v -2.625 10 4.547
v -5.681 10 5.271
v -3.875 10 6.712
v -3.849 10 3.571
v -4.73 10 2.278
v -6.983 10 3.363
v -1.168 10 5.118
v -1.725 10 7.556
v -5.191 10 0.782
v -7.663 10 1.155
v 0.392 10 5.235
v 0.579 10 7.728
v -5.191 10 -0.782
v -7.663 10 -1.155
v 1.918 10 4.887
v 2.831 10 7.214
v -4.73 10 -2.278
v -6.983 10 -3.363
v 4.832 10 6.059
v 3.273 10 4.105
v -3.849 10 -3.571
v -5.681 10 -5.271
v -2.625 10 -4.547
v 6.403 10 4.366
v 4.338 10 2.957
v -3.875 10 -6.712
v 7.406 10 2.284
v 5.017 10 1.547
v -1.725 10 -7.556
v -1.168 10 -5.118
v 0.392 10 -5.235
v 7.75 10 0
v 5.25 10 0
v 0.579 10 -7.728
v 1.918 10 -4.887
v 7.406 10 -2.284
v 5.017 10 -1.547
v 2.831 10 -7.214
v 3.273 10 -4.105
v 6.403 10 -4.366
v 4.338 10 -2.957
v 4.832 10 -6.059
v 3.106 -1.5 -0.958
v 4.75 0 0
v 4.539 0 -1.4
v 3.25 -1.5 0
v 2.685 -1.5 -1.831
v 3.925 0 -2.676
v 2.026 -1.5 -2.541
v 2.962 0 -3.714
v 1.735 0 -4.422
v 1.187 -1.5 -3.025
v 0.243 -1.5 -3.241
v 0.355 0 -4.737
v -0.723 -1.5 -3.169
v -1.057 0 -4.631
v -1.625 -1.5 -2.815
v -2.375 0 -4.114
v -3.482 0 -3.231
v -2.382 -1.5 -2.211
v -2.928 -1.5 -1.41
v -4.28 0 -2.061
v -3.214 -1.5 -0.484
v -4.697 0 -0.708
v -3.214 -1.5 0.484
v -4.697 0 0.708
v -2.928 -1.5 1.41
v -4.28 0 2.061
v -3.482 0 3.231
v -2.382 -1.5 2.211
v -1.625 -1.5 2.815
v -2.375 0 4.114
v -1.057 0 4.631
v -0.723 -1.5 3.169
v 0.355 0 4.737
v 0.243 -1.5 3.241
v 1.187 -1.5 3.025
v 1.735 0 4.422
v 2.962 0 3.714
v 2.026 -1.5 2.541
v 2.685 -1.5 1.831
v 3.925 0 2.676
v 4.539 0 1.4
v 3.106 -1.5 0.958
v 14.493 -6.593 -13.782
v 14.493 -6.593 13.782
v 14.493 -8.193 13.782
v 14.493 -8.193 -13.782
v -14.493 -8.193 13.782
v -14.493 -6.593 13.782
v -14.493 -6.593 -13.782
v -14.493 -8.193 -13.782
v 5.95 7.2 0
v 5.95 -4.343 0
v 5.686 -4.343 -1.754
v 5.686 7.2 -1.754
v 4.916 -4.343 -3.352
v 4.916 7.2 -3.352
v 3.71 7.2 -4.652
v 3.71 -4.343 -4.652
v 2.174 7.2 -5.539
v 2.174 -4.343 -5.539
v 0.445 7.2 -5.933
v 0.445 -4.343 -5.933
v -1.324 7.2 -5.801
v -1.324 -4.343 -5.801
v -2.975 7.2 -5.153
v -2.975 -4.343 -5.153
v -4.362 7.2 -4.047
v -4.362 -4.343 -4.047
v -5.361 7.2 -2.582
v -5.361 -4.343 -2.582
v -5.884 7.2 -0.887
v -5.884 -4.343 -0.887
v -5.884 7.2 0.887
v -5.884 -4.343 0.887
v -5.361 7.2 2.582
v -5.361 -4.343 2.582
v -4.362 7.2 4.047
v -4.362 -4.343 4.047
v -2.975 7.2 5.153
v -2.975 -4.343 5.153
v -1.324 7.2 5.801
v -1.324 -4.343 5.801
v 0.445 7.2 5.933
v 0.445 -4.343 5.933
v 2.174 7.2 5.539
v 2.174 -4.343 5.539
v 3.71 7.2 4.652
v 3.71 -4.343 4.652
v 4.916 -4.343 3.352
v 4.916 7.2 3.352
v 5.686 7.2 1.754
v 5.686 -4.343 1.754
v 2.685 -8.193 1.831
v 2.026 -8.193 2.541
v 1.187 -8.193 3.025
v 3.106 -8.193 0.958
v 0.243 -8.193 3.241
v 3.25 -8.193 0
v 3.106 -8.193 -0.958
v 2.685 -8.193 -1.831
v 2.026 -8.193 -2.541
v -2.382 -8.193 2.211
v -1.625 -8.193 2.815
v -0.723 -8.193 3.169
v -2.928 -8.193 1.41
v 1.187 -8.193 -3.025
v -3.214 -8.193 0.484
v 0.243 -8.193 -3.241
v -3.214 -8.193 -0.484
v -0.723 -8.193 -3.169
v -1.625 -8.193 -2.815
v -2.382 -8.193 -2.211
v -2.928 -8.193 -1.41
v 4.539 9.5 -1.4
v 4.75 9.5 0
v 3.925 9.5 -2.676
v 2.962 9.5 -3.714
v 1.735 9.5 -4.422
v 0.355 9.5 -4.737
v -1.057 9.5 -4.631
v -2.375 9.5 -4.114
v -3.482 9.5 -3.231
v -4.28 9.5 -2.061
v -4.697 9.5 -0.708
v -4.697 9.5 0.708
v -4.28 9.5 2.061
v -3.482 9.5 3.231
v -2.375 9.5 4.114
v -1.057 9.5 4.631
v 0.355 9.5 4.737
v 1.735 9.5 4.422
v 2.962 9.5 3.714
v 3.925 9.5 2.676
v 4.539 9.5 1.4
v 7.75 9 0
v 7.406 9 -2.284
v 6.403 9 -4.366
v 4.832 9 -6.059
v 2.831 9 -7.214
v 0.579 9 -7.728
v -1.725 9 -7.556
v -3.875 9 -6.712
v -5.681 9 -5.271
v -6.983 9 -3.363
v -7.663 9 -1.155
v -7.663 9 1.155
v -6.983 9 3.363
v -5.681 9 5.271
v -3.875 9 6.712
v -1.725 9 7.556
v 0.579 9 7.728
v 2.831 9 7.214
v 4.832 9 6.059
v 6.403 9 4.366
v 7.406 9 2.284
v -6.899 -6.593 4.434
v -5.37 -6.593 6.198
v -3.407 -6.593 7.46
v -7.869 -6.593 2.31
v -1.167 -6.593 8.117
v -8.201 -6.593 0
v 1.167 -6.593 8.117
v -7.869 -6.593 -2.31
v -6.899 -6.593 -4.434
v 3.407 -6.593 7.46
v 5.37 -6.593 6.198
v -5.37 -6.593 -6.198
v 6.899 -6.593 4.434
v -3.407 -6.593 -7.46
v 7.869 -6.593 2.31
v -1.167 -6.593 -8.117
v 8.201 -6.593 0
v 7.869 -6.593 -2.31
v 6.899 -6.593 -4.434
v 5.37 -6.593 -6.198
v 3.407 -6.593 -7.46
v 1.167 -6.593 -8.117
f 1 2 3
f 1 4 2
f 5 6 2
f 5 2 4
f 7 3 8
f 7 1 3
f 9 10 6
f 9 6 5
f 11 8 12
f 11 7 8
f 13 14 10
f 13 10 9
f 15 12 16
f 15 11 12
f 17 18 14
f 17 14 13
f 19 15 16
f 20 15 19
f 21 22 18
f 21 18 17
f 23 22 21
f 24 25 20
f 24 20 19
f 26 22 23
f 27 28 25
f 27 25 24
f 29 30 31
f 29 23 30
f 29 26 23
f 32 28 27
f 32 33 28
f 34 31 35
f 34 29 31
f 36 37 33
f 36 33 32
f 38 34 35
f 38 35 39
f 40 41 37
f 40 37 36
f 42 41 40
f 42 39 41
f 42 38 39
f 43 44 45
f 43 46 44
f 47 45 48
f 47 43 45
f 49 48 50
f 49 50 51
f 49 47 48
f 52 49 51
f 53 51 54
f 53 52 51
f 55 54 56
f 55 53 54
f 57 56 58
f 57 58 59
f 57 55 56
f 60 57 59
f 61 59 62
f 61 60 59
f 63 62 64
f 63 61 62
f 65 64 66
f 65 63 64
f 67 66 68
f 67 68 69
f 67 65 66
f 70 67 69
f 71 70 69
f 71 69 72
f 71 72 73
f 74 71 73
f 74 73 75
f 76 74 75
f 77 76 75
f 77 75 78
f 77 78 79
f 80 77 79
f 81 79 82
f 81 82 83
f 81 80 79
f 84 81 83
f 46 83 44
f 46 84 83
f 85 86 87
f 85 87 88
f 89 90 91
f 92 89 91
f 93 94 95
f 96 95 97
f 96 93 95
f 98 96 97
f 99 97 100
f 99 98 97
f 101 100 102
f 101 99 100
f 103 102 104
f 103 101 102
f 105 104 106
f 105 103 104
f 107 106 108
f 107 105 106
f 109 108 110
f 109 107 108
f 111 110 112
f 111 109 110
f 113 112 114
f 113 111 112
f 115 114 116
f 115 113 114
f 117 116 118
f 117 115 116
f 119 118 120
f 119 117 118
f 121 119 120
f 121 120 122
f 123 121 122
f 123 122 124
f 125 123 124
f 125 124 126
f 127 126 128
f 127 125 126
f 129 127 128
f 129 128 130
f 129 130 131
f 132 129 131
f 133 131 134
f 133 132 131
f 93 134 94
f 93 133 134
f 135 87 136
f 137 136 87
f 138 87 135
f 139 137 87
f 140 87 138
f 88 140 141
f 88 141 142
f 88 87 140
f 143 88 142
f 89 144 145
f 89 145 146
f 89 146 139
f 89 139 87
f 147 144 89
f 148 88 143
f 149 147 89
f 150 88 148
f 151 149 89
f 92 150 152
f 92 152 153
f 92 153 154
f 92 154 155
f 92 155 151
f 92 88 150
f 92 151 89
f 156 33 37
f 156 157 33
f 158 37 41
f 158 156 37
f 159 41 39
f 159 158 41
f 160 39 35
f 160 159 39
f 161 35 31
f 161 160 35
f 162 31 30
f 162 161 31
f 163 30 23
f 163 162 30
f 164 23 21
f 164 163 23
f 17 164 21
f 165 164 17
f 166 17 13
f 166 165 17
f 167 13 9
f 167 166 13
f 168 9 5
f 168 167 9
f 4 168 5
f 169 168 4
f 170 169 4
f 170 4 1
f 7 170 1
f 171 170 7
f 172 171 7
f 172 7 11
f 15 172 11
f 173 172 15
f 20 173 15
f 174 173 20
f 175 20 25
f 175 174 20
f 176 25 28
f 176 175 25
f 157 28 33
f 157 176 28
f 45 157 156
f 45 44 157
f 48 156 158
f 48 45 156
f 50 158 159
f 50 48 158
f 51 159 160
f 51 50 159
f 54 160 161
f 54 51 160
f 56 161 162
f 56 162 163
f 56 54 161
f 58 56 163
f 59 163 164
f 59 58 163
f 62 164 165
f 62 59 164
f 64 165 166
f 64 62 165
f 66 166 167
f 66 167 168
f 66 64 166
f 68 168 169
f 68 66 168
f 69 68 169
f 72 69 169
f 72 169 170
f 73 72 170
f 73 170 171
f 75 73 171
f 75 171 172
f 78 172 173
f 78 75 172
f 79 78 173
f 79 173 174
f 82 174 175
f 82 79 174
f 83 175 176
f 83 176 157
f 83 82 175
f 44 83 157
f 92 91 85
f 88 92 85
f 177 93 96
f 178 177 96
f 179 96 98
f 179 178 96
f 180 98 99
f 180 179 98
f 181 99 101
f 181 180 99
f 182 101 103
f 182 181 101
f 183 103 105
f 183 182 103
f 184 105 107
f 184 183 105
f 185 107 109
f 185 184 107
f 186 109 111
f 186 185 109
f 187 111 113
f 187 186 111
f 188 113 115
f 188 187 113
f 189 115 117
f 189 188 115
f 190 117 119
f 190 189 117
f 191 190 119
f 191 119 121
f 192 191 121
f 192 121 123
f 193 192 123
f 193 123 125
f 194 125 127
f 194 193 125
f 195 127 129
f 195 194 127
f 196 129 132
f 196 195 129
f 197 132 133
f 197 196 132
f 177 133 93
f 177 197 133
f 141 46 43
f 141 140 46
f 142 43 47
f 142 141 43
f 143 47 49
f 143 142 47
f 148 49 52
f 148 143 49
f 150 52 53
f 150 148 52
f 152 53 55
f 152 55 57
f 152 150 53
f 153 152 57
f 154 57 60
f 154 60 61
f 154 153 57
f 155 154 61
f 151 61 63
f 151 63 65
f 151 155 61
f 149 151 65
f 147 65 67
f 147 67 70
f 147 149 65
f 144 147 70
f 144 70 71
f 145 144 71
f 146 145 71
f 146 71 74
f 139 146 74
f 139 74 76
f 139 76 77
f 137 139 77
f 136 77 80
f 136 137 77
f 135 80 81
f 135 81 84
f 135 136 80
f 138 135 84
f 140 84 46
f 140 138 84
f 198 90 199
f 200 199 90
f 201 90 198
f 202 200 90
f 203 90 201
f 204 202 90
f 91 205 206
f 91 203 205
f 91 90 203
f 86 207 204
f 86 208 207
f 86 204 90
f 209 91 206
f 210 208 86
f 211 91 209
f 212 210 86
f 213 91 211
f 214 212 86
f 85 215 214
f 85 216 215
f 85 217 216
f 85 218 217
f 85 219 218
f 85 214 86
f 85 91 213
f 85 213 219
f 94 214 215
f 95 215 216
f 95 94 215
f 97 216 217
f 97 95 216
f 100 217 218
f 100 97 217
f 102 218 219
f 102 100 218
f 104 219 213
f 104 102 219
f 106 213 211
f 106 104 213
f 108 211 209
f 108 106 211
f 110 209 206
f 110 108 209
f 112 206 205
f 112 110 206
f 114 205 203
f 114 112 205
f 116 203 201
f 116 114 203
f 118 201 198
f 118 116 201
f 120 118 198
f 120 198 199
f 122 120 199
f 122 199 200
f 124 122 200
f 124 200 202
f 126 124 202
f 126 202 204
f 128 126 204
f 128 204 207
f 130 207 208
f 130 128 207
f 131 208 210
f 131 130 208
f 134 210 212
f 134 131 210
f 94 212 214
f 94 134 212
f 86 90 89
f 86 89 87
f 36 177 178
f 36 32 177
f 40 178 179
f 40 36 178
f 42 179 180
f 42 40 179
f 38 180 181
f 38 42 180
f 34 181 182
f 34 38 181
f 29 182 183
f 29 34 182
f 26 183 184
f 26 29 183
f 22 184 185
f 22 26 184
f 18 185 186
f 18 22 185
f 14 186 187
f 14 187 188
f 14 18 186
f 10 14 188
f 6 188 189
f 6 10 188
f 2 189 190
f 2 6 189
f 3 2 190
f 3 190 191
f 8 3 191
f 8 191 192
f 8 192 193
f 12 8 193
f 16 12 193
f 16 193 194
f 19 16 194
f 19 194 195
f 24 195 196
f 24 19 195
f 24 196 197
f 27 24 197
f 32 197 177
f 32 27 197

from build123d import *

# Parameters (mm, degrees)
SKETCH2_OUTSIDE_W       = 53.884
SKETCH2_OUTSIDE_H       = 53.884
SKETCH2_OUTSIDE_W_2     = 28.986815524
SKETCH2_OUTSIDE_H_2     = 27.563826398
CUT_EXTRUDE1_DEPTH      = 11
CUT_EXTRUDE1_DEPTH_BACK = 9.193473012


with BuildPart() as part:
    # Sketch1 → Revolve1 (revolve)
    with BuildSketch(Plane.XY):
        Polygon((4.75, 9.5), (4.75, 0), (3.25, -1.5), (3.25, -8.193473012), (20, -8.193473012), (20, -6.593473012), (8.200842899, -6.593473012), (5.95, -4.342630114), (5.95, 7.2), (7.75, 9), (7.75, 10), (5.25, 10), align=None)
    revolve(axis=Axis((0, -12.923275862, 0), (0, 1, 0)))

    # Sketch2 outside → Cut-Extrude1 (cut, two sides)
    with BuildSketch(Plane(origin=(0, 0, 0), x_dir=(1, 0, 0), z_dir=(0, 1, 0))) as cut_extrude1_sk:
        Rectangle(SKETCH2_OUTSIDE_W, SKETCH2_OUTSIDE_H)
        Rectangle(SKETCH2_OUTSIDE_W_2, SKETCH2_OUTSIDE_H_2, mode=Mode.SUBTRACT)
    extrude(amount=CUT_EXTRUDE1_DEPTH, mode=Mode.SUBTRACT)
    extrude(cut_extrude1_sk.sketch, amount=-CUT_EXTRUDE1_DEPTH_BACK, mode=Mode.SUBTRACT)


solid = part.part
